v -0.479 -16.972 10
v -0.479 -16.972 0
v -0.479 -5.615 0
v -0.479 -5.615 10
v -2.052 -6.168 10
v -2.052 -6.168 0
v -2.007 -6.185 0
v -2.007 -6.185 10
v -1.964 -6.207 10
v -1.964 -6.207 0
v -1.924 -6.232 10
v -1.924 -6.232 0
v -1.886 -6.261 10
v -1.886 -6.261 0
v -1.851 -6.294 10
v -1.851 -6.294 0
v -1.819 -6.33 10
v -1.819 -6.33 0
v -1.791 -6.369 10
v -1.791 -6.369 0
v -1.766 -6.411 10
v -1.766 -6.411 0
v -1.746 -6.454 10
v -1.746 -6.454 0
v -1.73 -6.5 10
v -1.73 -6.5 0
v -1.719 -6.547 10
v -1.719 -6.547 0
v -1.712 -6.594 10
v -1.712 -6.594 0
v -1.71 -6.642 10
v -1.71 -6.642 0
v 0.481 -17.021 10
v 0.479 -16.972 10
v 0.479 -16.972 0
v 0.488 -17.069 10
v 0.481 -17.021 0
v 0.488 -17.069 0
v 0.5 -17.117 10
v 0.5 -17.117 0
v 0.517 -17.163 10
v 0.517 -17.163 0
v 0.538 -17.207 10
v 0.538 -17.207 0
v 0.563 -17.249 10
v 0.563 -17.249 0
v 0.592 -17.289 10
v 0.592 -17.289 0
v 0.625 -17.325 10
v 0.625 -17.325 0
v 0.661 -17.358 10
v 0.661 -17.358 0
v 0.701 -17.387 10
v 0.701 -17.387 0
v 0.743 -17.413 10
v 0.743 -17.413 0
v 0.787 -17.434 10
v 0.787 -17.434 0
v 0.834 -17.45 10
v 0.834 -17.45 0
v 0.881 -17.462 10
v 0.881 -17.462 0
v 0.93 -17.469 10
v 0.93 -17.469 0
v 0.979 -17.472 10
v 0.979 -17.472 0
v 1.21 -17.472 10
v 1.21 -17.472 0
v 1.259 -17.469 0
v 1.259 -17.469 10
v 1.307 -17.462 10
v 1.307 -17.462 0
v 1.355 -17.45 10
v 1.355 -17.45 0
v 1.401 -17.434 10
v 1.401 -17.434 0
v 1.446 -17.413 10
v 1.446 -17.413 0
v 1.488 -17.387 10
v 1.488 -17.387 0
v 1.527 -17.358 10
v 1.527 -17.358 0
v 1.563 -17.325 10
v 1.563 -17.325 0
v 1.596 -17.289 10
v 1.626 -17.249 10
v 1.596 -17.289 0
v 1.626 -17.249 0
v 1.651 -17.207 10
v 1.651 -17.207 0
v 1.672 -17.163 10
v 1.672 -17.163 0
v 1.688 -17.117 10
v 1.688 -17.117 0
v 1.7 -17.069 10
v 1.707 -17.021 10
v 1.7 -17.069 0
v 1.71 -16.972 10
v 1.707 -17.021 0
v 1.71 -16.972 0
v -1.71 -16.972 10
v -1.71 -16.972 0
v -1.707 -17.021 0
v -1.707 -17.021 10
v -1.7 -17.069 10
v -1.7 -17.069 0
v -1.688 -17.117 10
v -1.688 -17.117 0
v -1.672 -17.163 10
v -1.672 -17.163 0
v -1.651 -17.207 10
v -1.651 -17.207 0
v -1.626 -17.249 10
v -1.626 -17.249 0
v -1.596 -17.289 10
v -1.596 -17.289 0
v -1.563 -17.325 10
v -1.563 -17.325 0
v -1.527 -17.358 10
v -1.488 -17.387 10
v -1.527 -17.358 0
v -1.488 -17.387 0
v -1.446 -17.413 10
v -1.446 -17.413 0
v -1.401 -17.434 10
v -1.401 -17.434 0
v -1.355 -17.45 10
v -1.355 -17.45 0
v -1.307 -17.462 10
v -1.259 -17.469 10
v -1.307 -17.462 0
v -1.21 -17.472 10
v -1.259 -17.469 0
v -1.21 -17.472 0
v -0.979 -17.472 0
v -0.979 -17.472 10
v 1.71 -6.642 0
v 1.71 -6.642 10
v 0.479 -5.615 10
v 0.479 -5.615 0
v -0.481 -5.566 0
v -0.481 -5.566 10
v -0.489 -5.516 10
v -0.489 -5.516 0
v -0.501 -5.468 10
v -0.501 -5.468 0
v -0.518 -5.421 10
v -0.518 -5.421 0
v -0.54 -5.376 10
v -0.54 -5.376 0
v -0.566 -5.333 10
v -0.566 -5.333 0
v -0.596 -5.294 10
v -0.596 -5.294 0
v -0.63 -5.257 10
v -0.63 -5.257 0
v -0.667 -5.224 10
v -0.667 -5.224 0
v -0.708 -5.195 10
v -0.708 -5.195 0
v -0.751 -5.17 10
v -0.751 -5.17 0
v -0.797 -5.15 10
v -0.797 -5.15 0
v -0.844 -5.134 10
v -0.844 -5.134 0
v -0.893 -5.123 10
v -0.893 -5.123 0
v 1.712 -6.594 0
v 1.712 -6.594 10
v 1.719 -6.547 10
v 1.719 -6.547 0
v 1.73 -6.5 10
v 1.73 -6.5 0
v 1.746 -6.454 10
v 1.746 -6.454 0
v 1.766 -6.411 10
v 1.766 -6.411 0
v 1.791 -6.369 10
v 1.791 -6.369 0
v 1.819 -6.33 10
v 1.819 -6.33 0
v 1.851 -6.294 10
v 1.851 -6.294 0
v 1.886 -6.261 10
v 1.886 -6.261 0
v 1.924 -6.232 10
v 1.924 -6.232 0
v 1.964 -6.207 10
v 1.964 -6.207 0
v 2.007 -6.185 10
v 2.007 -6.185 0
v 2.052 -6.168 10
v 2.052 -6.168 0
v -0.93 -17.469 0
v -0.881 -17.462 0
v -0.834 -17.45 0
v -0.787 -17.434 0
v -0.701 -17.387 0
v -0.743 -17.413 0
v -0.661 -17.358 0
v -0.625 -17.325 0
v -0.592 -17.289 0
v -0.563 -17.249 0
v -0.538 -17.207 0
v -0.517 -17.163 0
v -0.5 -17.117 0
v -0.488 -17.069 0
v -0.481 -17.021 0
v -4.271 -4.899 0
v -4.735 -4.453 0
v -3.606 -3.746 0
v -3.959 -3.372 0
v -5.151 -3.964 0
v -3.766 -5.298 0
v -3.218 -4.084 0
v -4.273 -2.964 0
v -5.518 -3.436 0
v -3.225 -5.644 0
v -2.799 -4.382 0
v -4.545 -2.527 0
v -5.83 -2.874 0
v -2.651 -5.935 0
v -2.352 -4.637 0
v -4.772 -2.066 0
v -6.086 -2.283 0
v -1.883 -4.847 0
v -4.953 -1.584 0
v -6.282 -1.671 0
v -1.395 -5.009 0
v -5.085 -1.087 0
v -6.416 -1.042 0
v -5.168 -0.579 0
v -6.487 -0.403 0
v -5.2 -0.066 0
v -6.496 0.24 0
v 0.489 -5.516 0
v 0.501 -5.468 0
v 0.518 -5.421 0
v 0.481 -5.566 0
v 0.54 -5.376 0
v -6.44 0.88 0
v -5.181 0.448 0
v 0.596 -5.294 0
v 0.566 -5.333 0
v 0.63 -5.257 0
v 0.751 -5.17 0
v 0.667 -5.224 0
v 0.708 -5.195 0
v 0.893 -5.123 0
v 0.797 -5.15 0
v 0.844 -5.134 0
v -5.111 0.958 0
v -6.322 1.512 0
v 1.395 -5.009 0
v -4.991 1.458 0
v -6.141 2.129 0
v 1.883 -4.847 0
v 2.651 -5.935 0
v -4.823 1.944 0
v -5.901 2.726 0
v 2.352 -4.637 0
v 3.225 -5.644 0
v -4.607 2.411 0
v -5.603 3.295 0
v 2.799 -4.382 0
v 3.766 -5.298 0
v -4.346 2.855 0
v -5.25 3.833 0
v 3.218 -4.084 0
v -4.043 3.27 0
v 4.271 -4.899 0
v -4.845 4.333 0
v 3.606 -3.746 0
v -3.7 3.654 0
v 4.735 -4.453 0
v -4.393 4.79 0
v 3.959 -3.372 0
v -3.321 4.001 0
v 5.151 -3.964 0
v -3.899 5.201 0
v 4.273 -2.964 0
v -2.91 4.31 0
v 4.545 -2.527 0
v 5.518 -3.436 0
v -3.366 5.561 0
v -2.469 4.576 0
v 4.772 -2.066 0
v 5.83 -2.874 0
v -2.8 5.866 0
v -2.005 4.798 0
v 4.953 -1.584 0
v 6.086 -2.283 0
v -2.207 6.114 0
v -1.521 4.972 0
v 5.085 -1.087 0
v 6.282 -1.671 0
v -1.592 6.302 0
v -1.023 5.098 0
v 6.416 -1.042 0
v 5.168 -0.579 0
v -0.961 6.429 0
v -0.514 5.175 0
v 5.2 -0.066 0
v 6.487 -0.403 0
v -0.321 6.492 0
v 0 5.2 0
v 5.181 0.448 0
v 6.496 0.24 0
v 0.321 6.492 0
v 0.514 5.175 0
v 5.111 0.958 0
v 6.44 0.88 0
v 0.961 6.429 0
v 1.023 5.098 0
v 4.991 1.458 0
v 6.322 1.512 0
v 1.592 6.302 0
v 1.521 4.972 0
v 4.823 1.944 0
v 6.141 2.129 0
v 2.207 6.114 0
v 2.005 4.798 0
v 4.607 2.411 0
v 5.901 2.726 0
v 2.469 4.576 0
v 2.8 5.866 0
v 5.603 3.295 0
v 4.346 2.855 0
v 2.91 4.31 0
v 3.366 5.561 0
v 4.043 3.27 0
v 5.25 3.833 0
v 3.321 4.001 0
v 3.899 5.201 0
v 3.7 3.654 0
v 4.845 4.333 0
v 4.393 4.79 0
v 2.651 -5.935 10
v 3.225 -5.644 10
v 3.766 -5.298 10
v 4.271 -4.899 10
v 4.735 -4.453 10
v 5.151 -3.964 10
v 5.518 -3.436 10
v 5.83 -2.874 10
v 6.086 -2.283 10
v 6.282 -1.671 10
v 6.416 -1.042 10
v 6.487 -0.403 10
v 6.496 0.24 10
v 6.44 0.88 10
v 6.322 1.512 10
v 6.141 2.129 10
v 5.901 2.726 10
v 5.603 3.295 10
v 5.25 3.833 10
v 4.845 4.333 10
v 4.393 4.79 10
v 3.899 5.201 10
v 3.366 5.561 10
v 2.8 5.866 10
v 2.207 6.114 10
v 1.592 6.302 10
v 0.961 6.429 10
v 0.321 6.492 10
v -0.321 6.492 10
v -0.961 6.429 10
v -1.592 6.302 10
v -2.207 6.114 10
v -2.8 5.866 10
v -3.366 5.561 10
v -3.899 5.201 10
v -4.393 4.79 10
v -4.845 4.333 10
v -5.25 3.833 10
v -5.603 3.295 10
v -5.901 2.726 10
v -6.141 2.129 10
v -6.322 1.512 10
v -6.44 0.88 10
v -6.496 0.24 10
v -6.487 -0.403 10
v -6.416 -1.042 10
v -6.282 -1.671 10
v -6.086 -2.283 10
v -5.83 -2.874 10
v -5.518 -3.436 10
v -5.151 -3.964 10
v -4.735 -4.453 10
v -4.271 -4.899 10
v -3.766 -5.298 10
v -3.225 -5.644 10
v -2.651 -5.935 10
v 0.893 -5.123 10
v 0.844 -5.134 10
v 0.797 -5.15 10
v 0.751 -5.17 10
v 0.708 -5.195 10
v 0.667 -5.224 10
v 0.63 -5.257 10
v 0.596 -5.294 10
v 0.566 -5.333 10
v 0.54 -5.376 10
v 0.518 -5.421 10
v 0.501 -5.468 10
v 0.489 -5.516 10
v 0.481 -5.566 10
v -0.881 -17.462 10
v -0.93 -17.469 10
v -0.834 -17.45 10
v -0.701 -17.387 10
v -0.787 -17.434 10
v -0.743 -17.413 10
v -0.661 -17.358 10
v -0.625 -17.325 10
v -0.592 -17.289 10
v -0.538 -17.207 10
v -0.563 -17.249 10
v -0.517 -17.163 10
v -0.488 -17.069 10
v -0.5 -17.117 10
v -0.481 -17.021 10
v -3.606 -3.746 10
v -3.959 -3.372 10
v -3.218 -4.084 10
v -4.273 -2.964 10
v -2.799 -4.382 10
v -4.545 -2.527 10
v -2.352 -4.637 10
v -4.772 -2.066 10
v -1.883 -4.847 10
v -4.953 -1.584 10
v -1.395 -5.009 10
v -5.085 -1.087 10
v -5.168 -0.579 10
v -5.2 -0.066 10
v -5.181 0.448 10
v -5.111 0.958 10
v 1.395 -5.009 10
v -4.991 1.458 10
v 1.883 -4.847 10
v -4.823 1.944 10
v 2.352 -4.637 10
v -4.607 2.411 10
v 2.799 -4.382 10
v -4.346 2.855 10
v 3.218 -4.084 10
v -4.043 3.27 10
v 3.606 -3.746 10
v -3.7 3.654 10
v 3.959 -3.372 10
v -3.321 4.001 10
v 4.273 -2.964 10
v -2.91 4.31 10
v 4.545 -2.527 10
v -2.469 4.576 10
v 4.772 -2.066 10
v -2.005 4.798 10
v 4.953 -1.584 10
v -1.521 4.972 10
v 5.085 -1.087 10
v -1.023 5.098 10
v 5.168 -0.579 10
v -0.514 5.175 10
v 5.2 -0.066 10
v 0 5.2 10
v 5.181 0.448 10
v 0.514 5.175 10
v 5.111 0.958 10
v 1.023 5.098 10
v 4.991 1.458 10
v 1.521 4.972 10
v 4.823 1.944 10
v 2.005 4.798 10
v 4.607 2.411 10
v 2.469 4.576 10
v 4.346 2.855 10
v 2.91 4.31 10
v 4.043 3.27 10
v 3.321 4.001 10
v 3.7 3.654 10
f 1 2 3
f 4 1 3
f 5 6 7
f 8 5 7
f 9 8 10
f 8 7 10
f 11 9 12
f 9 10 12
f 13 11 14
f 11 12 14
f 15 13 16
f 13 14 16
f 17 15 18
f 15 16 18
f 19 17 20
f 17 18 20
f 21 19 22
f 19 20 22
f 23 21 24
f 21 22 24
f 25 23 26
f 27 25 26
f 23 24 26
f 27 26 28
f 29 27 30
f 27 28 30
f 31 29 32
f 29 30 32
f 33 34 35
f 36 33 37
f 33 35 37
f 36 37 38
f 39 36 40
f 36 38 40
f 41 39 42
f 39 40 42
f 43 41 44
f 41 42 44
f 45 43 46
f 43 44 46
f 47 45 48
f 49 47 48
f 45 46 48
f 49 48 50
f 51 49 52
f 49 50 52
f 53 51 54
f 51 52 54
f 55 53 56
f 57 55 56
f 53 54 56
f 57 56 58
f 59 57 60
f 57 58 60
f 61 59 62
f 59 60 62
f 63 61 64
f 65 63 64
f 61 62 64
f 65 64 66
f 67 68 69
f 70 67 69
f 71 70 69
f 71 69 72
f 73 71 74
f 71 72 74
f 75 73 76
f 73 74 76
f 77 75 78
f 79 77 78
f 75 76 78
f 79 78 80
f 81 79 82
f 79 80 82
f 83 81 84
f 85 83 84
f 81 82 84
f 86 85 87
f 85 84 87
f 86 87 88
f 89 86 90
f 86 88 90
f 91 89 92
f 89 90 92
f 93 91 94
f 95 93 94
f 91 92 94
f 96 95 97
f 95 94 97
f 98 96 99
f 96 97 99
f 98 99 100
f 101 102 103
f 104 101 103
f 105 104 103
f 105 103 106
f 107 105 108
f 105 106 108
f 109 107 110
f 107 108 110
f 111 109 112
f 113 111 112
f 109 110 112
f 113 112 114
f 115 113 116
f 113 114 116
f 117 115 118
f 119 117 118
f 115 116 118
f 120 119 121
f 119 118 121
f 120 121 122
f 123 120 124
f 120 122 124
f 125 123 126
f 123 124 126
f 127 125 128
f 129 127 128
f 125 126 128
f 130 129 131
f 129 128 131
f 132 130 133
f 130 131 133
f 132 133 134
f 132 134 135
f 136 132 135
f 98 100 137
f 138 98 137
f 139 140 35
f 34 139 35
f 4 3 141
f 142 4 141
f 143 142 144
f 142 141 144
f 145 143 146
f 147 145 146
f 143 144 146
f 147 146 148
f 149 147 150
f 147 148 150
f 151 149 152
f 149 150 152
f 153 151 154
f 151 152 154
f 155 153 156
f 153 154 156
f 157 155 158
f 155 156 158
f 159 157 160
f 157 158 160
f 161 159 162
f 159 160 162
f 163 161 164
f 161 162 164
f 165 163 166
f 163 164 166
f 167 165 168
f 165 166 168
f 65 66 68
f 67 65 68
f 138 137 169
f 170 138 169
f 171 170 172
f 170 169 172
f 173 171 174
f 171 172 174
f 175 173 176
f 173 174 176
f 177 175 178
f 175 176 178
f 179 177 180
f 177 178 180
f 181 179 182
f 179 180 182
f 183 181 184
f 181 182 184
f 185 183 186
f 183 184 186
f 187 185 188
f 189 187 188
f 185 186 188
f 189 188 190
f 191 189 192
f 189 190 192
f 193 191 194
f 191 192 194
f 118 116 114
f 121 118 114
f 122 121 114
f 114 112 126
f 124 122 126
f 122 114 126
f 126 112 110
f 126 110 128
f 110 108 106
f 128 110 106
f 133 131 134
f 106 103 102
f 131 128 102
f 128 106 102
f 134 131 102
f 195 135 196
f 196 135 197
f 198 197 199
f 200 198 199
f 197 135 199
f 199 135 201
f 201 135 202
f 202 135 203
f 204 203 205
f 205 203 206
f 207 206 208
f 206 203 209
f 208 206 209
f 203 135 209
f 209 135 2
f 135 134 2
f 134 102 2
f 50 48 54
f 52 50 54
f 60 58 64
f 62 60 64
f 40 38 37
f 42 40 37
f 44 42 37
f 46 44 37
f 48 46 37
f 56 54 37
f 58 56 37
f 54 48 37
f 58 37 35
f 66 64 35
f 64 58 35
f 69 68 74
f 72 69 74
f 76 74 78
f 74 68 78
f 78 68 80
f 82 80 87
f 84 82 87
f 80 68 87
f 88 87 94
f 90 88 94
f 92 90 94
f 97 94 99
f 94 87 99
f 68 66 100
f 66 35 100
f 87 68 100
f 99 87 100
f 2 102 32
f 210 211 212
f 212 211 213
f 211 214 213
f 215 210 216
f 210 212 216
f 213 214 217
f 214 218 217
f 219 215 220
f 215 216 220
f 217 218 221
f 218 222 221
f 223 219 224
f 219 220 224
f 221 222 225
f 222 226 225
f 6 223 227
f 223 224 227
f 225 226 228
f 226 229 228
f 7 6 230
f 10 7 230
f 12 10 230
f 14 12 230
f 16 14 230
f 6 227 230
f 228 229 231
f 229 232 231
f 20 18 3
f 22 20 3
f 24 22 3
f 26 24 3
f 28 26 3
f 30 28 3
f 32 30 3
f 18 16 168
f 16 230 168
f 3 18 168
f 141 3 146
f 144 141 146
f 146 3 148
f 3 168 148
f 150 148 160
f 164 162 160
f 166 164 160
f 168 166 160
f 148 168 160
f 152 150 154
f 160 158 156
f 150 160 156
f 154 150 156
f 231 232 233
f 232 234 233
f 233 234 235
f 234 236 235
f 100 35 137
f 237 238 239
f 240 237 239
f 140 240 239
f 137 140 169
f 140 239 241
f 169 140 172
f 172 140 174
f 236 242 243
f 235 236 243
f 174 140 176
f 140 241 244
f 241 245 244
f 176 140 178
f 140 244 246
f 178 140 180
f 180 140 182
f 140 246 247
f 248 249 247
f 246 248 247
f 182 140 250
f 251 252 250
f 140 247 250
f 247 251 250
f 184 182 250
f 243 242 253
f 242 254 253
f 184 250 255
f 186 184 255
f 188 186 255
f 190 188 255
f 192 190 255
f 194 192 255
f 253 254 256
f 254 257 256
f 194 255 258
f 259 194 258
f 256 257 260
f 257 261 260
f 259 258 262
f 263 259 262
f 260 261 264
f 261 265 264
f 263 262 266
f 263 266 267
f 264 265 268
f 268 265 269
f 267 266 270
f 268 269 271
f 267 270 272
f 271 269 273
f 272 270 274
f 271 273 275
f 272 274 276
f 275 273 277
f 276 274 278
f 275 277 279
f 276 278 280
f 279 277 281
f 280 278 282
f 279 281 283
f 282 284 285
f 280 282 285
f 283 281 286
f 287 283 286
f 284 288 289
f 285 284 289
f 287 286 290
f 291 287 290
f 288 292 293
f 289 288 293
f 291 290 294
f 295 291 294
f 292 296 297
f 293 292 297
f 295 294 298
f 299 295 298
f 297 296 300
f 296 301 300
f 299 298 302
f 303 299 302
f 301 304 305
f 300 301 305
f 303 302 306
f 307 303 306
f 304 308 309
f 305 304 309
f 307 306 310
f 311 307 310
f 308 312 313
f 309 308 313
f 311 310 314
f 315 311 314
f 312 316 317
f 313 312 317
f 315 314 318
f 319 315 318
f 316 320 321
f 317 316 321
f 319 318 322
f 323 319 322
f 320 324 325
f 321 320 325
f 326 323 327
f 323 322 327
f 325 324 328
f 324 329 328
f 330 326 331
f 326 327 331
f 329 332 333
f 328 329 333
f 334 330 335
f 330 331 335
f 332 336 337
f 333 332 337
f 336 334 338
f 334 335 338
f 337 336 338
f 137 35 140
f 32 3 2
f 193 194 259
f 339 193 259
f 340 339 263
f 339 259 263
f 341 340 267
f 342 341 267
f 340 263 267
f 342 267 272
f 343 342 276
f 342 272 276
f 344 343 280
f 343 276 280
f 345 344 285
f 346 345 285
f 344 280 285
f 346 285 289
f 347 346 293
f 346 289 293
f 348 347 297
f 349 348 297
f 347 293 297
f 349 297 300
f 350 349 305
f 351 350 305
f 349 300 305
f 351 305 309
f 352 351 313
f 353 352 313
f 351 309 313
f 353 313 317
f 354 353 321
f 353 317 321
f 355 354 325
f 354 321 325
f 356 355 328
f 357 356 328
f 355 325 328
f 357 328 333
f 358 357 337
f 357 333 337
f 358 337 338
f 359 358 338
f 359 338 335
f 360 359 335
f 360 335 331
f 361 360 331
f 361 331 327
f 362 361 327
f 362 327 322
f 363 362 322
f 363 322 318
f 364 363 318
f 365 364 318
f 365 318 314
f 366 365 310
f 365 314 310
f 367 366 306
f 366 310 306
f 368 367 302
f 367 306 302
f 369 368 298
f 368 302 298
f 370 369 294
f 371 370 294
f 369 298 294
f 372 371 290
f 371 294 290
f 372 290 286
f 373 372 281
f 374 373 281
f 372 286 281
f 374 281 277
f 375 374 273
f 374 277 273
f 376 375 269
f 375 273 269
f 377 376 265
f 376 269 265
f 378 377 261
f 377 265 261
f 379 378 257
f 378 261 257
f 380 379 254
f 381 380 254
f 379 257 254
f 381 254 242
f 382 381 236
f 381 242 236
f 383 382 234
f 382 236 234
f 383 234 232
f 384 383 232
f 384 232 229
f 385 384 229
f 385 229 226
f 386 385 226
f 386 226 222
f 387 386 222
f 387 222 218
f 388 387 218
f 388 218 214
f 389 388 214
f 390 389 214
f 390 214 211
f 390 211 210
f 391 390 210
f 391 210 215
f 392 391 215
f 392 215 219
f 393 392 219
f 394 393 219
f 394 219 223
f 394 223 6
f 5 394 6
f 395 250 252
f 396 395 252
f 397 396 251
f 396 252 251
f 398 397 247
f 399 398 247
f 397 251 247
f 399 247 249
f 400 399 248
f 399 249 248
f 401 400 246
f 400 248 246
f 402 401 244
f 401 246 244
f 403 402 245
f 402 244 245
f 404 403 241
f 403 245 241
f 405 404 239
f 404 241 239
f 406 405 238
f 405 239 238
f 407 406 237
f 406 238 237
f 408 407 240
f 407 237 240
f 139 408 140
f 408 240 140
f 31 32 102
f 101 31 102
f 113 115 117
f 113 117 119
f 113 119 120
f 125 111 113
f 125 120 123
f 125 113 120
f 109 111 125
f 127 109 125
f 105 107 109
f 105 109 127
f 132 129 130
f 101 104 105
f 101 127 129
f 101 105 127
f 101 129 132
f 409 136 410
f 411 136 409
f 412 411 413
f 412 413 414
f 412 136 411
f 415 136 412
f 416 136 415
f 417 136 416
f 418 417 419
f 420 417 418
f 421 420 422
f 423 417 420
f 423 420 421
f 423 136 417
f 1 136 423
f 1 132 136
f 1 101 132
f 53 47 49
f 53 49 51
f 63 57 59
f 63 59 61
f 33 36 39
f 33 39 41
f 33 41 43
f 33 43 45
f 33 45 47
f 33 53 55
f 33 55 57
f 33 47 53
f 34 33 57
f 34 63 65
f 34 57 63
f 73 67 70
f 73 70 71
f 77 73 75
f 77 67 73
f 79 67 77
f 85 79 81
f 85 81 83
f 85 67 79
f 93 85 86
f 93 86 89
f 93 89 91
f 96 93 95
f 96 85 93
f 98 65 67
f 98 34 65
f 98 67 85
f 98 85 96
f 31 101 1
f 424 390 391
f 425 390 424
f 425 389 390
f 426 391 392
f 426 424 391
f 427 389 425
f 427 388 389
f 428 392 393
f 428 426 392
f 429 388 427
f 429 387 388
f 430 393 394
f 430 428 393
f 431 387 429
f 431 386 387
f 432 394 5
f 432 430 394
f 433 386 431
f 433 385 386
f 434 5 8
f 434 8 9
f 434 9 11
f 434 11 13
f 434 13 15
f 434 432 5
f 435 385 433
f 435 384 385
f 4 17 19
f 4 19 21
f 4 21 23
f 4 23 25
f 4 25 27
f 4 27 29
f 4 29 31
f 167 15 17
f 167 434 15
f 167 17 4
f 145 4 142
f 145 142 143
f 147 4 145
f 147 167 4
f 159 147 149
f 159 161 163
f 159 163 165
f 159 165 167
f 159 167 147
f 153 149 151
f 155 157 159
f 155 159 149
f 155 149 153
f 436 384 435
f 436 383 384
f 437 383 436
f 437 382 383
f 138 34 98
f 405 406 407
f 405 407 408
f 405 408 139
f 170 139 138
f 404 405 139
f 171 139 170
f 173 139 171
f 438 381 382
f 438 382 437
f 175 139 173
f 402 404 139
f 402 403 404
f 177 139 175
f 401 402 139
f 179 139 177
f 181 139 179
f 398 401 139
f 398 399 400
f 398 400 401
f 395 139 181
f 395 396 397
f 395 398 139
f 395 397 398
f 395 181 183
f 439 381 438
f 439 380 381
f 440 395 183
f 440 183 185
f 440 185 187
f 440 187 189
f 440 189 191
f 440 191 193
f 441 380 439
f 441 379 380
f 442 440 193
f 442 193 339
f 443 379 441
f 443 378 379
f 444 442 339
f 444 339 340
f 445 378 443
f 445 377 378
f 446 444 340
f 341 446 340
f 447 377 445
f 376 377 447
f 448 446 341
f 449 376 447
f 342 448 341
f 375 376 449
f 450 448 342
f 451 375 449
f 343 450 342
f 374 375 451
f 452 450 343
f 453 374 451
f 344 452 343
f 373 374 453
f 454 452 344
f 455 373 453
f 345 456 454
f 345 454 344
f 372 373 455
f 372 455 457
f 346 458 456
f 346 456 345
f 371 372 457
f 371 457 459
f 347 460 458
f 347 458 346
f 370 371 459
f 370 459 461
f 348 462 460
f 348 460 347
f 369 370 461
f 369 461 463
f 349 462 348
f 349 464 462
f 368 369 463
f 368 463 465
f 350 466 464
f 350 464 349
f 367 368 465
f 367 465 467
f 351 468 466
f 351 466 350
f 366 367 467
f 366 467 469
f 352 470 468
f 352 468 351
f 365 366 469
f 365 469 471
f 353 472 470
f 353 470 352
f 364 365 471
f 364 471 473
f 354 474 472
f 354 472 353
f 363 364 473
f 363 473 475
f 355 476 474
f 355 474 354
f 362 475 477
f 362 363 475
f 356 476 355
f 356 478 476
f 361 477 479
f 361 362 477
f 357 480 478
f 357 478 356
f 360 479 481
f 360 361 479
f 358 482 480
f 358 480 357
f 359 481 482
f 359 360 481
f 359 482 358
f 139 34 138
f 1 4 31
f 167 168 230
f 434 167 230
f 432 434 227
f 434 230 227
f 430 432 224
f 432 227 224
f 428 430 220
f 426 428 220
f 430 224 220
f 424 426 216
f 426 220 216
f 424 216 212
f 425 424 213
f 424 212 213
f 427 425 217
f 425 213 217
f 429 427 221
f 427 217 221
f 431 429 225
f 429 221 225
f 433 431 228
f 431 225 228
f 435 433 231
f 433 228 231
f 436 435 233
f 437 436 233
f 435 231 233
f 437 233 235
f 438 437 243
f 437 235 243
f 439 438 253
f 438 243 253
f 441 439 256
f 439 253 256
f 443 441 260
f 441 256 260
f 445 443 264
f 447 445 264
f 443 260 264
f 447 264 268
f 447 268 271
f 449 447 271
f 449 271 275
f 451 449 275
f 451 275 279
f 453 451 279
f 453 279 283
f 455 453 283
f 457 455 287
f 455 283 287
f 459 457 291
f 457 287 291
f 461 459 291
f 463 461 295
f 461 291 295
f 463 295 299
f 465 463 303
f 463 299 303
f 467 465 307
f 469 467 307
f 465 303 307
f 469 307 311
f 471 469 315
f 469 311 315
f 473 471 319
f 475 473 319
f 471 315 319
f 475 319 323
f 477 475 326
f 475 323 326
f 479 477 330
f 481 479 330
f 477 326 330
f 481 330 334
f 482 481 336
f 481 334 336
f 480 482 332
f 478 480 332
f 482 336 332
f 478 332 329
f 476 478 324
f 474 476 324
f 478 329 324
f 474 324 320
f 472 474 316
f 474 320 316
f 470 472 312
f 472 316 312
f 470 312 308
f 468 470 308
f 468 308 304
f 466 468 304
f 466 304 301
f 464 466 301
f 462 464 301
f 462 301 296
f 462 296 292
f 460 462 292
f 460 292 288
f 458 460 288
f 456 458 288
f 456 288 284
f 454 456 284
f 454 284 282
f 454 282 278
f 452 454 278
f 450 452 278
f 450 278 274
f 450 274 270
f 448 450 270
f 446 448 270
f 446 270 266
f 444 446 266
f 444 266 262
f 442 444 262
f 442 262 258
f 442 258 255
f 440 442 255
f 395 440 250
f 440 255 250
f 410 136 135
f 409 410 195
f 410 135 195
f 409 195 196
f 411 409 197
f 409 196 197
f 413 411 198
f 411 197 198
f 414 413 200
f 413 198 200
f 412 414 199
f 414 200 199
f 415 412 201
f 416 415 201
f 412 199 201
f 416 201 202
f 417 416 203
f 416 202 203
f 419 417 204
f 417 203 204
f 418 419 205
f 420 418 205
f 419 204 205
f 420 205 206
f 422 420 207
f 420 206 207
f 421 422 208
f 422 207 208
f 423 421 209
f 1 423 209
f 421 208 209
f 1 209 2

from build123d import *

# Parameters (mm, degrees)
BOSS_EXTRUDE1_DEPTH = 10


with BuildPart() as part:
    # Sketch1 → Boss-Extrude1 (new body)
    with BuildSketch(Plane.XY):
        with BuildLine():
            Line((0.478661478, -5.615355885), (0.478661478, -16.97170584))
            ThreePointArc((0.478661478, -16.97170584), (0.625108087, -17.325259231), (0.978661478, -17.47170584))
            Line((0.978661478, -17.47170584), (1.209808881, -17.47170584))
            ThreePointArc((1.209808881, -17.47170584), (1.563362272, -17.325259231), (1.709808881, -16.97170584))
            Line((1.709808881, -16.97170584), (1.709808881, -6.642043715))
            ThreePointArc((1.709808881, -6.642043715), (1.804271123, -6.349572986), (2.05196539, -6.167612021))
            ThreePointArc((2.05196539, -6.167612021), (0, 6.5), (-2.05196539, -6.167612021))
            ThreePointArc((-2.05196539, -6.167612021), (-1.804271123, -6.349572986), (-1.709808881, -6.642043715))
            Line((-1.709808881, -6.642043715), (-1.709808881, -16.97170584))
            ThreePointArc((-1.709808881, -16.97170584), (-1.563362272, -17.325259231), (-1.209808881, -17.47170584))
            Line((-1.209808881, -17.47170584), (-0.978661478, -17.47170584))
            ThreePointArc((-0.978661478, -17.47170584), (-0.625108087, -17.325259231), (-0.478661478, -16.97170584))
            Line((-0.478661478, -16.97170584), (-0.478661478, -5.615355885))
            ThreePointArc((-0.478661478, -5.615355885), (-0.595958101, -5.293582478), (-0.89281398, -5.122780807))
            ThreePointArc((-0.89281398, -5.122780807), (0, 5.2), (0.89281398, -5.122780807))
            ThreePointArc((0.89281398, -5.122780807), (0.595958101, -5.293582478), (0.478661478, -5.615355885))
        make_face()
    extrude(amount=BOSS_EXTRUDE1_DEPTH)


solid = part.part
